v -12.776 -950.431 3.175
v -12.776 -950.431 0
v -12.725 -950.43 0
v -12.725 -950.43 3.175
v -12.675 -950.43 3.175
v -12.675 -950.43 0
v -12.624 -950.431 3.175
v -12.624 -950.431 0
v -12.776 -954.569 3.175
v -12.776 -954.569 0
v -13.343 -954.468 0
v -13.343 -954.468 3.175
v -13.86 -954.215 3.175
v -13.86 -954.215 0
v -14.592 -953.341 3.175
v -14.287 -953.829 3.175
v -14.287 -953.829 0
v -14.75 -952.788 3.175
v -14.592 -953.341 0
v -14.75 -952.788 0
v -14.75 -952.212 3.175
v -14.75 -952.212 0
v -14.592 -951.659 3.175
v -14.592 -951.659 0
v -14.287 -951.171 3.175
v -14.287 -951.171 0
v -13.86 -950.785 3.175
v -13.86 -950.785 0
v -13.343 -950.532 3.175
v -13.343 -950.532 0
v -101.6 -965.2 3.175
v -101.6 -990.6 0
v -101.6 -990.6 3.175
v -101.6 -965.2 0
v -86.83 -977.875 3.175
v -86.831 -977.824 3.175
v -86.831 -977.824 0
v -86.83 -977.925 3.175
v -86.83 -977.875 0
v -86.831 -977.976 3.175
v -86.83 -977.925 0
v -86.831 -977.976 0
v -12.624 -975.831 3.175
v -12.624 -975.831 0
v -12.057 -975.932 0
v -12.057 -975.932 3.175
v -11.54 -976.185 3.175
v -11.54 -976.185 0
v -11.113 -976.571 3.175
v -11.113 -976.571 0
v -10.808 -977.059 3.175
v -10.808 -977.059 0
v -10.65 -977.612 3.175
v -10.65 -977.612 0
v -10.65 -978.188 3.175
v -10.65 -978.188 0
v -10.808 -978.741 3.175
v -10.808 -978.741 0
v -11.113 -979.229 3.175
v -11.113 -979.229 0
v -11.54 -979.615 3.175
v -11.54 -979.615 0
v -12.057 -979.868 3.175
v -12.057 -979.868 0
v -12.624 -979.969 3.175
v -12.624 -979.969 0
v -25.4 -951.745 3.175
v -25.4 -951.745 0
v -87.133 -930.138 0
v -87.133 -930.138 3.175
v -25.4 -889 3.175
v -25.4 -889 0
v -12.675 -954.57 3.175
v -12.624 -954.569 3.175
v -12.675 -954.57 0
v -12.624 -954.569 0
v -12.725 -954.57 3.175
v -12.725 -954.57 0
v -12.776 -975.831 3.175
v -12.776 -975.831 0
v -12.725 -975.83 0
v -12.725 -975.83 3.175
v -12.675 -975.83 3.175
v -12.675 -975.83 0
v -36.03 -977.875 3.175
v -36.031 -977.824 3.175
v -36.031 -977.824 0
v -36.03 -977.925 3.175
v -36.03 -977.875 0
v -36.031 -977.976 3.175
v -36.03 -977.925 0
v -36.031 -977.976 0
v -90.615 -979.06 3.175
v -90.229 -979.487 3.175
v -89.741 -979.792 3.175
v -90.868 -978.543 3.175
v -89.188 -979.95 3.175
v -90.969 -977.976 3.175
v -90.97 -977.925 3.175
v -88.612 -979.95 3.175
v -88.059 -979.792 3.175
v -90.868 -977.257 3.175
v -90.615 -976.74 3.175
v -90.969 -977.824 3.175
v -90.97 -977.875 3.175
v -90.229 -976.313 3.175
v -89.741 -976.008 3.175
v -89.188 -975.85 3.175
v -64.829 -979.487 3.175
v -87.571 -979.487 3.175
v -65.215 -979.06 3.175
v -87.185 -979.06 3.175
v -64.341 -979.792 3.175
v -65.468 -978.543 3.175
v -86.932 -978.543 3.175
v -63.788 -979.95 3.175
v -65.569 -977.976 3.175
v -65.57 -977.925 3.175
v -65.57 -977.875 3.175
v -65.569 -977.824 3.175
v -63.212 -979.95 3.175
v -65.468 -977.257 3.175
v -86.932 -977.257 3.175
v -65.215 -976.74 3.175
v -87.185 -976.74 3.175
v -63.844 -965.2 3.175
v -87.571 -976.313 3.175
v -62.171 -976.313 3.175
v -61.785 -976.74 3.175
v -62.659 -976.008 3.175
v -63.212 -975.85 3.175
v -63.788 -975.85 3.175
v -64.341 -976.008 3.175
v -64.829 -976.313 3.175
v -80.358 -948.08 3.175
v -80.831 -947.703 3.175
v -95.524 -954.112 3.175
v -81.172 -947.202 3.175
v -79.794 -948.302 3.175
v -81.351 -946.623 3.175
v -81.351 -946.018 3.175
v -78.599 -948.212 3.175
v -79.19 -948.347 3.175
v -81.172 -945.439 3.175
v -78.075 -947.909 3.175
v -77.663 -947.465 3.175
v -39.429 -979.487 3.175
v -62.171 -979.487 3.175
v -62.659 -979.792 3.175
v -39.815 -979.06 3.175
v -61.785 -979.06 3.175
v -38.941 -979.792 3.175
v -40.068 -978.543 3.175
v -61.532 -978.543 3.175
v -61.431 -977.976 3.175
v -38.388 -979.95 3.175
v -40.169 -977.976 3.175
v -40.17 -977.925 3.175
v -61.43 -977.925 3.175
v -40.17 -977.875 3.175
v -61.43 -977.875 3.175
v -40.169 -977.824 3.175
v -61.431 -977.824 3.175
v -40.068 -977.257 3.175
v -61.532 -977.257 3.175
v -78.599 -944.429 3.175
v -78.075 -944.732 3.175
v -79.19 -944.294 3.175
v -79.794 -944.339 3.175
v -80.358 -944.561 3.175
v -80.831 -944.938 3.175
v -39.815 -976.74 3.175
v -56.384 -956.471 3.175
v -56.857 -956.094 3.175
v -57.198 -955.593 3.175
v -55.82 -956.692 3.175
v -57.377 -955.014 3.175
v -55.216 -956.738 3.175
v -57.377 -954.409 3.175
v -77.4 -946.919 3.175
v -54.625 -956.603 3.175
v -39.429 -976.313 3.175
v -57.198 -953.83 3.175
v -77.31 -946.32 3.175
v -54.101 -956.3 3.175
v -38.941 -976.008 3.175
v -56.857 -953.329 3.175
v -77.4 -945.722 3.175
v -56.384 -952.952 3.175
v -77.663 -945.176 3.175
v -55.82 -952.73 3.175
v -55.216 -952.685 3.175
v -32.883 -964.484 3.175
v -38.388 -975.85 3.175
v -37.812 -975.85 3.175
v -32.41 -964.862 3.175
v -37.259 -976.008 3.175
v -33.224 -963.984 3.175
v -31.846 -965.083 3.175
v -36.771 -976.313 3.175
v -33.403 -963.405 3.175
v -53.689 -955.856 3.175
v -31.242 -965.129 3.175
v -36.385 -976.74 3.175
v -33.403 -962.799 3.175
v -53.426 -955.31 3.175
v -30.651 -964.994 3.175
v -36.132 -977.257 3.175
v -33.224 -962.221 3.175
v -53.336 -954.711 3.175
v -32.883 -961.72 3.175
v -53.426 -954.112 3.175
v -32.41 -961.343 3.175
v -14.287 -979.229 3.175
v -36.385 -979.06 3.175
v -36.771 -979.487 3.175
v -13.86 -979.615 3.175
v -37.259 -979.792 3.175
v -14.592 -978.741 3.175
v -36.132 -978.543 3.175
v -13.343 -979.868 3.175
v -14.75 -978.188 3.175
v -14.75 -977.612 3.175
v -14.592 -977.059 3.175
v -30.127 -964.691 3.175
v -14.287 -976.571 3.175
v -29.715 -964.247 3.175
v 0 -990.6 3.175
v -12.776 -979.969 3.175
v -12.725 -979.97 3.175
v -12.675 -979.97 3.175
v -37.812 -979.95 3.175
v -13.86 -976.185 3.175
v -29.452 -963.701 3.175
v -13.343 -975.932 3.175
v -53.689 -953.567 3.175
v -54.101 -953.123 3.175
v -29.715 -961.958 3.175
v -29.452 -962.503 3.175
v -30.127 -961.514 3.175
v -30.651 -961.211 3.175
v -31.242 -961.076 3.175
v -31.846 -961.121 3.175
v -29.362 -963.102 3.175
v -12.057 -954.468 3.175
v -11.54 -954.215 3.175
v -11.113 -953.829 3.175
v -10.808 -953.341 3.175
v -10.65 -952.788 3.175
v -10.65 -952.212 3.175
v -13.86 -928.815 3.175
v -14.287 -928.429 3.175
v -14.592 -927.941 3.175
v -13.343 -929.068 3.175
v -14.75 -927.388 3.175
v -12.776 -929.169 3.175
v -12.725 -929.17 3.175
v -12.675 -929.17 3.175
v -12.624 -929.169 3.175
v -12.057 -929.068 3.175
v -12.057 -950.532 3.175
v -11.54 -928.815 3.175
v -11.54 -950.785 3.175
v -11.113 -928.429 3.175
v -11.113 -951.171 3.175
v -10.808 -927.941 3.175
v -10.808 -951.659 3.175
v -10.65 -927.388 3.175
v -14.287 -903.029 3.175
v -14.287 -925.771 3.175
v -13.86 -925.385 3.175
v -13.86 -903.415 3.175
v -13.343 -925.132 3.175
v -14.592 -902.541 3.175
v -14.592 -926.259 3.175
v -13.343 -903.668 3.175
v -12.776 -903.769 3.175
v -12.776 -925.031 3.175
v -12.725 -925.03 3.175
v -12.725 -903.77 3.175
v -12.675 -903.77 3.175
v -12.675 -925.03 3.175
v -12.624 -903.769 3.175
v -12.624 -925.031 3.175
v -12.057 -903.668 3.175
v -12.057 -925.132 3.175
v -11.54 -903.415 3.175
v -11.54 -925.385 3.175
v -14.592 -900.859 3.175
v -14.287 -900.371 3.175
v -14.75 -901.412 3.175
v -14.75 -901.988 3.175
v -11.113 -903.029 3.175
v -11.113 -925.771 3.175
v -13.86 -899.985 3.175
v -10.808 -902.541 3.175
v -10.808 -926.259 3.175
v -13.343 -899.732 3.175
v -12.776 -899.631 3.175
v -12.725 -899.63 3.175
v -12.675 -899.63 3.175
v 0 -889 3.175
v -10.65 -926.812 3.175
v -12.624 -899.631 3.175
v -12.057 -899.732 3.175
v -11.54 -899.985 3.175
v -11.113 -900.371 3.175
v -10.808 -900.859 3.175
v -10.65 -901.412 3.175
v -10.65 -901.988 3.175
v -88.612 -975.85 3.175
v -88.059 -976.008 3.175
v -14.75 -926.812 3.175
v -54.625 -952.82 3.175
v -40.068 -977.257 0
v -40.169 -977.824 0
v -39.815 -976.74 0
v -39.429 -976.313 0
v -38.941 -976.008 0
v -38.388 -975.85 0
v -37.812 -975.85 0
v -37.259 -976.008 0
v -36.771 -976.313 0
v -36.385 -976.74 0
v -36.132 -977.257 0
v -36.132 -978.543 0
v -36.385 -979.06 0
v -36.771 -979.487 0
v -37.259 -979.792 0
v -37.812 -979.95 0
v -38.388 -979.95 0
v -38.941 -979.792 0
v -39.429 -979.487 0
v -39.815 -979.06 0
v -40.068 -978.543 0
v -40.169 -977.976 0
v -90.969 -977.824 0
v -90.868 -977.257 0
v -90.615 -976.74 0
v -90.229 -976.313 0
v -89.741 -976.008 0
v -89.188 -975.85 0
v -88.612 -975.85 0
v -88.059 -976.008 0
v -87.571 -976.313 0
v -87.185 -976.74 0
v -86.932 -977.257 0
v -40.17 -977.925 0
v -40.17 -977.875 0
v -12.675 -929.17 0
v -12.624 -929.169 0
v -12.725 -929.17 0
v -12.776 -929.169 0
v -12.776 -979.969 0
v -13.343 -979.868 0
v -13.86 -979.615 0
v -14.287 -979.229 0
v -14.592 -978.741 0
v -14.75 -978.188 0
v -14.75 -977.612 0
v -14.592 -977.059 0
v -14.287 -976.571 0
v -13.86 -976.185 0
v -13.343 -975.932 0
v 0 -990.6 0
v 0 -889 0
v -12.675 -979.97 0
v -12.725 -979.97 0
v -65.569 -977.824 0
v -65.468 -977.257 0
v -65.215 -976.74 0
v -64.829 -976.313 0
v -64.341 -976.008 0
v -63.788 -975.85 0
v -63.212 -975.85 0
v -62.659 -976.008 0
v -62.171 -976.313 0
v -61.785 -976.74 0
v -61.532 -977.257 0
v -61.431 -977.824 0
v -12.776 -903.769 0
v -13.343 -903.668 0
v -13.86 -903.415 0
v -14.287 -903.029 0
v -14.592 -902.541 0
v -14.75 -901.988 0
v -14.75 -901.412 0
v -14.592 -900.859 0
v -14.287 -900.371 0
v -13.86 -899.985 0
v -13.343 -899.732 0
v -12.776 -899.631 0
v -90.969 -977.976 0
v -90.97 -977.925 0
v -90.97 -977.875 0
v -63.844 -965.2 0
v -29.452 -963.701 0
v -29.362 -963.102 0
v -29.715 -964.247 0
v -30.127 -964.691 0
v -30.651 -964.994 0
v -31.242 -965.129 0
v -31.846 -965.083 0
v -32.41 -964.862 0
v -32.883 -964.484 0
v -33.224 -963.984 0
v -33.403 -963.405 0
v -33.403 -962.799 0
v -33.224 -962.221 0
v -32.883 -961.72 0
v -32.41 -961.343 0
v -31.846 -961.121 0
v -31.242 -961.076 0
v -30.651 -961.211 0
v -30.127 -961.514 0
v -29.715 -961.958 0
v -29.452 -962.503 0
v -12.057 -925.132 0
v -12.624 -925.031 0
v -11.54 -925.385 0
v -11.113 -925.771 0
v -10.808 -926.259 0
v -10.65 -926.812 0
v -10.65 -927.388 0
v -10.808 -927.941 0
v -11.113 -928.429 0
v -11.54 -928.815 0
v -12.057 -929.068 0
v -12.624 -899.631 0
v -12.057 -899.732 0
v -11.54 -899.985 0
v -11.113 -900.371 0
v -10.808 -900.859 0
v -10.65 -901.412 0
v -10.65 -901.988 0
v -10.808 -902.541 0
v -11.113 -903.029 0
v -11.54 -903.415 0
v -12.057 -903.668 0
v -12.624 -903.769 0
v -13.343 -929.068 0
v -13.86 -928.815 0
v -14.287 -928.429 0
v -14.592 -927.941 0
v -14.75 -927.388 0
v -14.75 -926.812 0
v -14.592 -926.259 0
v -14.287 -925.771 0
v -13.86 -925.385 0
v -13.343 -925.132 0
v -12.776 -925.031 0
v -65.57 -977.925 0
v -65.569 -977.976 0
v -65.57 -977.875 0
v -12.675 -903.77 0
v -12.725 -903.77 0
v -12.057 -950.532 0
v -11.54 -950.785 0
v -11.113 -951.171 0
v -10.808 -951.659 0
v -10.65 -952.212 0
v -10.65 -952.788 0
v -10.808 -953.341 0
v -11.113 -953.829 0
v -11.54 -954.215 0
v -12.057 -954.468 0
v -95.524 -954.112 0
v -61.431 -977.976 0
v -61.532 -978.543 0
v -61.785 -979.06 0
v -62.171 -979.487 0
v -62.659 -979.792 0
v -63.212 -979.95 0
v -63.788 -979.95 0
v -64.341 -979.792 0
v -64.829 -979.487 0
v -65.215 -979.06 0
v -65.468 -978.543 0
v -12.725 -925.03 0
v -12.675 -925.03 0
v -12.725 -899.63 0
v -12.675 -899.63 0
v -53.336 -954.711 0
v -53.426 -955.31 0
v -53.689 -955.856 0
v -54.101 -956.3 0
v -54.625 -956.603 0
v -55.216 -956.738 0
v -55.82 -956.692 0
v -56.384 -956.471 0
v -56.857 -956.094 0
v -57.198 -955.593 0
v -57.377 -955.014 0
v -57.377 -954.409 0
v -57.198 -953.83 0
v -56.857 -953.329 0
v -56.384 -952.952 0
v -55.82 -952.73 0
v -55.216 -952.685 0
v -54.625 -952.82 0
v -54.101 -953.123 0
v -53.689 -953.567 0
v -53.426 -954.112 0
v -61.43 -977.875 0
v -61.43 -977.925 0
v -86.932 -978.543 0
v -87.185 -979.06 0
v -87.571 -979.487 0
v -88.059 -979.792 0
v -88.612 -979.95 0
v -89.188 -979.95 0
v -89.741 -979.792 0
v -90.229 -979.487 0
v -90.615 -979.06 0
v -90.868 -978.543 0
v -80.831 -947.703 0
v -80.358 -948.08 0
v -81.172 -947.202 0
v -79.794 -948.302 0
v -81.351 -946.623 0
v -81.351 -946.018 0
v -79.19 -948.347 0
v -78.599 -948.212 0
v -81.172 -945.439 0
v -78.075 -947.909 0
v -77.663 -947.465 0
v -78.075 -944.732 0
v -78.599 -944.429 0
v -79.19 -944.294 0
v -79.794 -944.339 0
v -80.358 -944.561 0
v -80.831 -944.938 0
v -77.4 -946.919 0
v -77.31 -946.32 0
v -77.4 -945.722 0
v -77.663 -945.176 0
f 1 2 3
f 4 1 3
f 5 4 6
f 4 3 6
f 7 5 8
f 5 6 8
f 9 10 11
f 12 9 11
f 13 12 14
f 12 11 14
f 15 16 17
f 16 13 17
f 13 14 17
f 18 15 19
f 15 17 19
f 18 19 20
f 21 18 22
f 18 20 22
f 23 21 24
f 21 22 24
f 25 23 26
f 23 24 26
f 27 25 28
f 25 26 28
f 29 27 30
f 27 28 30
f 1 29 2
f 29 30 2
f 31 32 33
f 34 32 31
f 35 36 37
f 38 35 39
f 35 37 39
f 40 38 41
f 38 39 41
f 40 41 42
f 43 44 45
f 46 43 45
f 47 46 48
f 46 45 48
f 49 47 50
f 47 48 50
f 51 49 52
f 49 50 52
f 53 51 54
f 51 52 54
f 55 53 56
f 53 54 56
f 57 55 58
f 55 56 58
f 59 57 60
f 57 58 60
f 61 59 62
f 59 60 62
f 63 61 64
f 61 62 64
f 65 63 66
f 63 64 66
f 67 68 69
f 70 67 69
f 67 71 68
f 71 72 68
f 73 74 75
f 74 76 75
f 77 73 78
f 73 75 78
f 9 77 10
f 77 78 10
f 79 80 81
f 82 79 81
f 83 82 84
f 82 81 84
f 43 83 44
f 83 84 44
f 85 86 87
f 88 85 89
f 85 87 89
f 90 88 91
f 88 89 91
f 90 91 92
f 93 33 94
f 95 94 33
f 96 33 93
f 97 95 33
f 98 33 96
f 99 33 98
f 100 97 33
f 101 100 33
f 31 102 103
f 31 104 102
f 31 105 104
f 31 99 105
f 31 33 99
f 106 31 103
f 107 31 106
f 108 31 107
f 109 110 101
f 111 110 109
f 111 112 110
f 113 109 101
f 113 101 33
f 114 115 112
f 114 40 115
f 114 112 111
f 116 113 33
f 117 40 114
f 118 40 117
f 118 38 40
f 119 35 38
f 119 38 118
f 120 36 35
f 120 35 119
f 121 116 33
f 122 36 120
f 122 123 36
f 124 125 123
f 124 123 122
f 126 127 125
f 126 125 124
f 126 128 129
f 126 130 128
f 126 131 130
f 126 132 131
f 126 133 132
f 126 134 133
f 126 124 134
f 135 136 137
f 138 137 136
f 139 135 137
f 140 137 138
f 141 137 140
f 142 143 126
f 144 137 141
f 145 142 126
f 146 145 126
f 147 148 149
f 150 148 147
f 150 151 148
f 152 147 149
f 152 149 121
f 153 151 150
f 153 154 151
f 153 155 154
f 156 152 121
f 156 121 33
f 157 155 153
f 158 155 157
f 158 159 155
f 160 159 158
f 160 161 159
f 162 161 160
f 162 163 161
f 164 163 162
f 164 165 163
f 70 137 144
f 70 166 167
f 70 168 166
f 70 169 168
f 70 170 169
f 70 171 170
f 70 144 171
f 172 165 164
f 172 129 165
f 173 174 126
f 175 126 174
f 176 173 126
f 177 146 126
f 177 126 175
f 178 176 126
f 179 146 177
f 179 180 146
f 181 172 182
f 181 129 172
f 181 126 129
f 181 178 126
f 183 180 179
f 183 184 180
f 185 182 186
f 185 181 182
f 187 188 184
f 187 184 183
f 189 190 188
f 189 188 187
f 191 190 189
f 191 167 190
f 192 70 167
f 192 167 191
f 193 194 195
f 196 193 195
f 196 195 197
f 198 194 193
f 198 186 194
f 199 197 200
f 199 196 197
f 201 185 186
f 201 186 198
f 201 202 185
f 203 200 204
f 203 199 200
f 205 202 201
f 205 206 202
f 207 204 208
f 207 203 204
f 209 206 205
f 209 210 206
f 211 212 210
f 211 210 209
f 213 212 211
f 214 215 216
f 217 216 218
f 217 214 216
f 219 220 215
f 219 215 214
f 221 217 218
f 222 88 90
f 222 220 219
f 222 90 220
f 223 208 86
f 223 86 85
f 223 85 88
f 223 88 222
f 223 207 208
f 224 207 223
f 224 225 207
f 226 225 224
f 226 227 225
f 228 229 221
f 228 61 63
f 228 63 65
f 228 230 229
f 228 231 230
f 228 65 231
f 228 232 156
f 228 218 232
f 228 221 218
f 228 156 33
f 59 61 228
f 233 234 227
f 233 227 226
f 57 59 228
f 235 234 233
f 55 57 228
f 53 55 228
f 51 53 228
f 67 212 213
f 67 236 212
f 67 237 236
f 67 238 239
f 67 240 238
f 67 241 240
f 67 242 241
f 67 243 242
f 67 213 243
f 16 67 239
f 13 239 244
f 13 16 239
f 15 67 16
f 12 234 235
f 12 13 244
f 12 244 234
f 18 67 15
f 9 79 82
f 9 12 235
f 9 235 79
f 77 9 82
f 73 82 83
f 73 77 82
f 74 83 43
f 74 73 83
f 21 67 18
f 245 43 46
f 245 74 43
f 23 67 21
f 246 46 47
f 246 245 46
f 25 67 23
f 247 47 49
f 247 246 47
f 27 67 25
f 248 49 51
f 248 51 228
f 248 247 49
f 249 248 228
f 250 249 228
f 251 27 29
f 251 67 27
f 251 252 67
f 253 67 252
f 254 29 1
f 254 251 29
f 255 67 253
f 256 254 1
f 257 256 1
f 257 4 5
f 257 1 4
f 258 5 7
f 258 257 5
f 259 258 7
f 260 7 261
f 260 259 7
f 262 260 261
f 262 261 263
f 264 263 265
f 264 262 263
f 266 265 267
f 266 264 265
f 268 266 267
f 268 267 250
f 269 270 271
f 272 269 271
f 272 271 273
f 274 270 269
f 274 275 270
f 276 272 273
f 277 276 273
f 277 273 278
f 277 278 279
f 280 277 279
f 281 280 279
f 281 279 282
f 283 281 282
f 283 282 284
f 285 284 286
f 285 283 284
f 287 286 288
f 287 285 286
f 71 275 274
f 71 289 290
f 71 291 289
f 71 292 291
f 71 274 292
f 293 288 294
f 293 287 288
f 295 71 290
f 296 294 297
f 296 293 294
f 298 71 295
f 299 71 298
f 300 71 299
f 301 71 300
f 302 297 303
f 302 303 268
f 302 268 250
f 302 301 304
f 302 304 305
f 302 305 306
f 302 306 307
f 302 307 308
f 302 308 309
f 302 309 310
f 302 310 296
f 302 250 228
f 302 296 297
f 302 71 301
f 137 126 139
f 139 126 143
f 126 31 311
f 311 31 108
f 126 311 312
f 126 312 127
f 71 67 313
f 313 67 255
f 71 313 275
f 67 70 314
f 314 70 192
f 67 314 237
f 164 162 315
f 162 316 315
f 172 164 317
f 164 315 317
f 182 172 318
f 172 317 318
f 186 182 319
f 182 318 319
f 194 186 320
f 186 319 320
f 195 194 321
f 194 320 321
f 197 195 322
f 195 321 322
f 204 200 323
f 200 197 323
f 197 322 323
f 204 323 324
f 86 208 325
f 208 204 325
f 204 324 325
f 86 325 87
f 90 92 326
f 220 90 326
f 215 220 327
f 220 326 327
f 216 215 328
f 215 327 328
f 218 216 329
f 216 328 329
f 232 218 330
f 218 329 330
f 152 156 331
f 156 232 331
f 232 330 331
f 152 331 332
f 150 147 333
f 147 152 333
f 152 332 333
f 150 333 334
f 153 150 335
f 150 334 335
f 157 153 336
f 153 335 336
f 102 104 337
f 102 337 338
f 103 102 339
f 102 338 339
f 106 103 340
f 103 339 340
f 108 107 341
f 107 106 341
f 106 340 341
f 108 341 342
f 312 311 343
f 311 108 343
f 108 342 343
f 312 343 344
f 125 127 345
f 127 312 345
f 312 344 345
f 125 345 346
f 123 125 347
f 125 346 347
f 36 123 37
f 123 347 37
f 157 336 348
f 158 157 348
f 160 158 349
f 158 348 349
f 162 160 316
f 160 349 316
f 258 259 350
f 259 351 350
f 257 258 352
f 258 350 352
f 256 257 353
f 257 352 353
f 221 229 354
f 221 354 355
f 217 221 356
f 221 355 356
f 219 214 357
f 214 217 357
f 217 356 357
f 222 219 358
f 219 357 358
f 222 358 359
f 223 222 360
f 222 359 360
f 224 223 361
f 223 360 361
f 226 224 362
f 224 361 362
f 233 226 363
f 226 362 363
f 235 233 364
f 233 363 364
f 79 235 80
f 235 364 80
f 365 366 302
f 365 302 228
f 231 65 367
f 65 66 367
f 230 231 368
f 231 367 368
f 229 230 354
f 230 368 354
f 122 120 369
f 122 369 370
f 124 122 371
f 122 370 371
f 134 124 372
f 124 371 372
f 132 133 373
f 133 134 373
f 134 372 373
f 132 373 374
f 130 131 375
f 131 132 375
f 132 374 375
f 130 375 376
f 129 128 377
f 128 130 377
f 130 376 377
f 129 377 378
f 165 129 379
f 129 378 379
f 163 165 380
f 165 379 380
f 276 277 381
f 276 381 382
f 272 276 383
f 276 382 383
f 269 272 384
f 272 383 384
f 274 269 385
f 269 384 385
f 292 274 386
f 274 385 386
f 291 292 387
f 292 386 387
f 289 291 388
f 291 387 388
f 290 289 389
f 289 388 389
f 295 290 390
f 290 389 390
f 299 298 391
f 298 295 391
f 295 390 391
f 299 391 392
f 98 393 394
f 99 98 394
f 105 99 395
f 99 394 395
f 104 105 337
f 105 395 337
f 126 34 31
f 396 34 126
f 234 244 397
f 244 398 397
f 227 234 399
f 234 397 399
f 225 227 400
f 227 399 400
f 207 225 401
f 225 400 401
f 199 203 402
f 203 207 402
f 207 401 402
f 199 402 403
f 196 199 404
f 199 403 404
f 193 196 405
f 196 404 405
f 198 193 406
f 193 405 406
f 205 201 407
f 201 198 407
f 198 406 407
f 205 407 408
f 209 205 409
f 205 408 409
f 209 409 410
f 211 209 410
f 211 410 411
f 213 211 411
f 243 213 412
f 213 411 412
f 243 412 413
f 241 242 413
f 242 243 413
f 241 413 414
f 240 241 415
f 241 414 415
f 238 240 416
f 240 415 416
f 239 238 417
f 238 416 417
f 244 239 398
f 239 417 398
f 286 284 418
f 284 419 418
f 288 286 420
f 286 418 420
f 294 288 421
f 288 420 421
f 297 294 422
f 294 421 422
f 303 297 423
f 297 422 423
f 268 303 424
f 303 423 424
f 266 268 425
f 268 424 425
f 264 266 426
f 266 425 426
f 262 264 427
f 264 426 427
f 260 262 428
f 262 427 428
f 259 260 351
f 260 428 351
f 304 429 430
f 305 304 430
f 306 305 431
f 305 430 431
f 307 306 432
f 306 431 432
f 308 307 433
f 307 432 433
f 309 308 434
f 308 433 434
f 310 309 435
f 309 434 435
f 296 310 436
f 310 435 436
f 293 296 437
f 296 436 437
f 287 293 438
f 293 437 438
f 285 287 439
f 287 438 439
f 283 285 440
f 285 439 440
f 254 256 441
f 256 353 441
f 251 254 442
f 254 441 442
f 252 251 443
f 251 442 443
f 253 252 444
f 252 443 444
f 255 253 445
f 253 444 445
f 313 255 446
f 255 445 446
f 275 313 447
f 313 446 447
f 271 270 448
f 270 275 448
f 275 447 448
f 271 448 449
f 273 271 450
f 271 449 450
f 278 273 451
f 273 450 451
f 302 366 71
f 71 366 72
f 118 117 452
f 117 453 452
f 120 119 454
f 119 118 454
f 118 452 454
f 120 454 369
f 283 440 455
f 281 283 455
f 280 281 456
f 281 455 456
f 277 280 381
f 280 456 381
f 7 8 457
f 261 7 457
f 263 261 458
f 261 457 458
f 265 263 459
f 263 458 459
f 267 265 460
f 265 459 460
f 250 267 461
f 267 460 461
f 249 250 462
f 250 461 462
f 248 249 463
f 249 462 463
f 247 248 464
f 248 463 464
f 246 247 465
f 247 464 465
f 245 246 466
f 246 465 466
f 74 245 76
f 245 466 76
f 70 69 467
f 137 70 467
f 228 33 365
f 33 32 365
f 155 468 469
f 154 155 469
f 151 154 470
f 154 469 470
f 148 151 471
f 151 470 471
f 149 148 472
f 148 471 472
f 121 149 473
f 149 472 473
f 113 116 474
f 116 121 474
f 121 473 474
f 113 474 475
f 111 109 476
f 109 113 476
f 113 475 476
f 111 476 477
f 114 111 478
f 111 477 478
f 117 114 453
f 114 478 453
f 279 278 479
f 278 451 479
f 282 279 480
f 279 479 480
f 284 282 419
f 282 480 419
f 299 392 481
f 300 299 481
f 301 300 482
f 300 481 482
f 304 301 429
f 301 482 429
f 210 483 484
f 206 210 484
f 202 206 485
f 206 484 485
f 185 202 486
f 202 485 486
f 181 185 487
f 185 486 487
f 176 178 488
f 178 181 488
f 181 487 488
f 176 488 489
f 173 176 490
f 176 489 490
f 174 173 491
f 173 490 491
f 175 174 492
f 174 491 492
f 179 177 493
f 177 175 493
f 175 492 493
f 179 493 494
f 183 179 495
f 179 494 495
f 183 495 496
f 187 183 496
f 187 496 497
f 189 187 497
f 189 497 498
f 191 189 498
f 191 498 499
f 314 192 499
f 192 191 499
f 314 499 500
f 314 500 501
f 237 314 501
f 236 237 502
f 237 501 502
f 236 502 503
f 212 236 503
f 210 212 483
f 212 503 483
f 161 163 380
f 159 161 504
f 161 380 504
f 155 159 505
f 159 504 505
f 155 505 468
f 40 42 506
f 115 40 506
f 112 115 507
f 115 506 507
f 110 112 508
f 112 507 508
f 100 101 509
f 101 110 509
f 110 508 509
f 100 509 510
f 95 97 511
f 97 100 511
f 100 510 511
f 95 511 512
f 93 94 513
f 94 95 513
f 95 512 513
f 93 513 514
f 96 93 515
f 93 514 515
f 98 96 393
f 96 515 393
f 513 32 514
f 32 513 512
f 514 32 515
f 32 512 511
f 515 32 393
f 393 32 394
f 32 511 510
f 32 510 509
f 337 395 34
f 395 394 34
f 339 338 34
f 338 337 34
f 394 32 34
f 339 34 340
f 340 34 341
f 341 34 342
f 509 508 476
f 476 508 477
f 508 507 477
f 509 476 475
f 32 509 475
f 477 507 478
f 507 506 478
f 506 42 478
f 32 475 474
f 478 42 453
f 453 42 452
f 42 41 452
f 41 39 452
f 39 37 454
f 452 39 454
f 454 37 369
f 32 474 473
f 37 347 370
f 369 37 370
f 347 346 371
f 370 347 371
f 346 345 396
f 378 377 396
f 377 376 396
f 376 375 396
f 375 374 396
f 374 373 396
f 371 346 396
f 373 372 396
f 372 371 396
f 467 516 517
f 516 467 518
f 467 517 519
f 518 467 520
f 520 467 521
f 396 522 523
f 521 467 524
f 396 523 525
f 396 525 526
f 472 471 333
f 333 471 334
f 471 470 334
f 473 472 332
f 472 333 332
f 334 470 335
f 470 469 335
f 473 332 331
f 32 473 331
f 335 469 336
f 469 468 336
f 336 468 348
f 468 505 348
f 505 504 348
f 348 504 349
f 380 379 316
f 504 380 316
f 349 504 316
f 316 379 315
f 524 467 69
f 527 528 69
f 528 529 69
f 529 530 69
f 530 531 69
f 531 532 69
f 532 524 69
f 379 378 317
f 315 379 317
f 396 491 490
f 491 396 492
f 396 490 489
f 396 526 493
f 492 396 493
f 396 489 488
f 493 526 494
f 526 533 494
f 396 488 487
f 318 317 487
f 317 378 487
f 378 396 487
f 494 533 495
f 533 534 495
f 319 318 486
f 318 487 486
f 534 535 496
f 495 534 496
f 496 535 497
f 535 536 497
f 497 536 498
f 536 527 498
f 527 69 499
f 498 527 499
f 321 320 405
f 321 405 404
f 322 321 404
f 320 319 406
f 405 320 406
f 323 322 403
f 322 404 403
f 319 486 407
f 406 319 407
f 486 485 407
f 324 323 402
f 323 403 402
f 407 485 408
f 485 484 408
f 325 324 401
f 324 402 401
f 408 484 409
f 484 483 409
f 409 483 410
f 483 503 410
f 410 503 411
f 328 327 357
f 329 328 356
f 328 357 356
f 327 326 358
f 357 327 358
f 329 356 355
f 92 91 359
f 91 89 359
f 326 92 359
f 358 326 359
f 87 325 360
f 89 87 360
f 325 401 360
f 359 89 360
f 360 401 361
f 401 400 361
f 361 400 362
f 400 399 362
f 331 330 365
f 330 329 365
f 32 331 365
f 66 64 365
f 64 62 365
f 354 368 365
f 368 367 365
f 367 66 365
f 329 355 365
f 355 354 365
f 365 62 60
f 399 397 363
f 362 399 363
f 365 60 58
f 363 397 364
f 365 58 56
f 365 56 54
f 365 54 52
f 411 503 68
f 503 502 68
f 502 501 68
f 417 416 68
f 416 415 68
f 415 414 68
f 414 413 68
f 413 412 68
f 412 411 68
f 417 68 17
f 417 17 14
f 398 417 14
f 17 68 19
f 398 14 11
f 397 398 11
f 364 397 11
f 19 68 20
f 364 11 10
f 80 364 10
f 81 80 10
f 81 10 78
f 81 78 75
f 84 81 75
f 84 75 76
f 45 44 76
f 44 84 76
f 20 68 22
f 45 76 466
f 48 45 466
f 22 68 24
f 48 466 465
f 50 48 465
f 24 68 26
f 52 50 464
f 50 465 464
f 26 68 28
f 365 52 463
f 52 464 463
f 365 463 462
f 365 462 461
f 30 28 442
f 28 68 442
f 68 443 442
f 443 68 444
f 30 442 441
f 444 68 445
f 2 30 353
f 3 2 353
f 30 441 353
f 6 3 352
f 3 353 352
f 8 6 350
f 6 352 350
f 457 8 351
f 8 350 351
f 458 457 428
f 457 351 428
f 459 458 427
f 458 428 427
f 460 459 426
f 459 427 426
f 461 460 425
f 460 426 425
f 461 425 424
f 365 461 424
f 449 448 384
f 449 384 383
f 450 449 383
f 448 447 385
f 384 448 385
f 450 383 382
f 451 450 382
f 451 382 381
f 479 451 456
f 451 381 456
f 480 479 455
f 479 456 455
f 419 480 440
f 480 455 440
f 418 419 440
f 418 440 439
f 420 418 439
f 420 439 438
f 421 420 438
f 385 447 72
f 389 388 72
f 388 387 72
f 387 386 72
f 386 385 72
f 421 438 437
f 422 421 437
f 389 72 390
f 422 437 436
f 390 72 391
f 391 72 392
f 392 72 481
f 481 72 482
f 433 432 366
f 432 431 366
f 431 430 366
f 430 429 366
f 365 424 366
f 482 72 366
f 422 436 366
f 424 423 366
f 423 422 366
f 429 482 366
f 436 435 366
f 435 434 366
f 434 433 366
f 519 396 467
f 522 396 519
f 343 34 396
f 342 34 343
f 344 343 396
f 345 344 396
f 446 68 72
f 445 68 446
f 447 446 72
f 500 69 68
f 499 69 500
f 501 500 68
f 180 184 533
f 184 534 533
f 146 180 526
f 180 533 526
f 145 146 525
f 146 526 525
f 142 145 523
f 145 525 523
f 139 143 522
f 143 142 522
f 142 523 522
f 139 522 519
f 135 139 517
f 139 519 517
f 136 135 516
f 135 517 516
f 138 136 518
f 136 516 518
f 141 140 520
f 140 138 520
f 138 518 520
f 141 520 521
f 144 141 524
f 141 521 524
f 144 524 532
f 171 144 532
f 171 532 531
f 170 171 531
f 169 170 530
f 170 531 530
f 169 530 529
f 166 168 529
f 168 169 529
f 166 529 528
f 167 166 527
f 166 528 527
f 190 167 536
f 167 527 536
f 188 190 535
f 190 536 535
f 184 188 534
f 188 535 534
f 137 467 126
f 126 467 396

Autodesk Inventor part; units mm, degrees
ref_plane "YZ Plane" through (0, 0, 0) normal (1, 0, 0) x (0, 1, 0)
ref_plane "XZ Plane" through (0, 0, 0) normal (0, 1, 0) x (-1, 0, 0)
ref_plane "Work Plane1" through (0, 0, 0) normal (0, 0, 1) x (1, 0, 0)
sketch "Sketch1" plane through (0, 0, 0) normal (0, 0, 1) x (1, 0, 0)
  line L0 (-533.4, -800.8554) -> (-63.844, -965.2) projected
  line L1 (-533.4, -965.2) -> (-25.4, -965.2) projected
  line L2 (-25.4, -951.7446) -> (-494.956, -787.4) projected
  line L3 (-533.4, -990.6) -> (-25.4, -990.6) projected
  line L4 (-25.4, -787.4) -> (-25.4, -1498.6) projected
  line L5 (0, -787.4) -> (0, -1498.6) projected
  arc A0 (-40.1687, -977.9762) -> (-36.0313, -977.9762) centre (-38.1, -977.9) ccw projected
  arc A1 (-36.0313, -977.8238) -> (-40.1687, -977.8238) centre (-38.1, -977.9) ccw projected
  arc A2 (-65.5687, -977.9762) -> (-61.4313, -977.9762) centre (-63.5, -977.9) ccw projected
  arc A3 (-61.4313, -977.8238) -> (-65.5687, -977.8238) centre (-63.5, -977.9) ccw projected
  line L6 (-116.3687, -977.8238) -> (-137.6313, -977.8238) projected
  arc A4 (-12.7762, -975.8313) -> (-12.7762, -979.9687) centre (-12.7, -977.9) ccw projected
  arc A5 (-12.6238, -979.9687) -> (-12.6238, -975.8313) centre (-12.7, -977.9) ccw projected
  arc A6 (-12.7762, -950.4313) -> (-12.7762, -954.5687) centre (-12.7, -952.5) ccw projected
  arc A7 (-12.6238, -954.5687) -> (-12.6238, -950.4313) centre (-12.7, -952.5) ccw projected
  arc A8 (-12.7762, -925.0313) -> (-12.7762, -929.1687) centre (-12.7, -927.1) ccw projected
  arc A9 (-12.6238, -929.1687) -> (-12.6238, -925.0313) centre (-12.7, -927.1) ccw projected
  circle A10 centre (-31.3935, -963.1023) radius 2.032 projected
  circle A11 centre (-55.3675, -954.7114) radius 2.032 projected
  circle A12 centre (-79.3415, -946.3205) radius 2.032 projected
  arc A13 (-12.7762, -899.6313) -> (-12.7762, -903.7687) centre (-12.7, -901.7) ccw projected
  arc A14 (-12.6238, -903.7687) -> (-12.6238, -899.6313) centre (-12.7, -901.7) ccw projected
  arc A15 (-90.9687, -977.9762) -> (-86.8313, -977.9762) centre (-88.9, -977.9) ccw projected
  arc A16 (-86.8313, -977.8238) -> (-90.9687, -977.8238) centre (-88.9, -977.9) ccw projected
  line L7 (-12.7, -901.7) -> (-12.7, -876.3) construction
  line L8 (-25.4, -889) -> (0, -889) construction
  line L9 (0, -889) -> (-25.4, -889)
  line L10 (-88.9, -977.9) -> (-114.3, -977.9) construction
  line L11 (-101.6, -990.6) -> (-101.6, -965.2)
  line L12 (-101.6, -990.6) -> (0, -990.6)
  line L13 (0, -990.6) -> (0, -889)
  line L14 (-25.4, -889) -> (-25.4, -951.7446)
  line L15 (-101.6, -965.2) -> (-63.844, -965.2)
  line L16 (-79.3415, -946.3205) -> (-103.3155, -937.9296) construction
  line L17 (-95.524, -954.112) -> (-87.1331, -930.138) construction
  line L18 (-87.1331, -930.138) -> (-95.524, -954.112)
  line L19 (-95.524, -954.112) -> (-63.844, -965.2)
  line L20 (-87.1331, -930.138) -> (-25.4, -951.7446)
  circle A17 centre (-12.7, -901.7) radius 2.0701
  circle A18 centre (-12.7, -927.1) radius 2.0701
  circle A19 centre (-12.7, -952.5) radius 2.0701
  circle A20 centre (-12.7, -977.9) radius 2.0701
  circle A21 centre (-38.1, -977.9) radius 2.0701
  circle A22 centre (-63.5, -977.9) radius 2.0701
  circle A23 centre (-88.9, -977.9) radius 2.0701
  circle A24 centre (-79.3415, -946.3205) radius 2.032
  circle A25 centre (-55.3675, -954.7114) radius 2.032
  circle A26 centre (-31.3935, -963.1023) radius 2.032
  point P0 (0, 0)
  point P1 (-12.7762, -903.7687)
  point P2 (-12.6238, -899.6313)
  point P3 (-12.7762, -929.1687)
  point P4 (-12.6238, -925.0313)
  point P5 (-12.7762, -954.5687)
  point P6 (-12.6238, -950.4313)
  point P7 (-12.7762, -979.9687)
  point P8 (-12.6238, -975.8313)
  point P9 (-86.8313, -977.9762)
  point P10 (-40.1687, -977.8238)
  point P11 (-36.0313, -977.9762)
  point P12 (-25.4, -990.6)
  dimension "d0" = 25.4
  dimension "d1" = 25.4
  dimension "d2" = 25.4
extrude "Extrusion1" add sketch "Sketch1" along normal blind 3.175
properties part number "arrow bracket (70.1 and 19.29 degrees)"
